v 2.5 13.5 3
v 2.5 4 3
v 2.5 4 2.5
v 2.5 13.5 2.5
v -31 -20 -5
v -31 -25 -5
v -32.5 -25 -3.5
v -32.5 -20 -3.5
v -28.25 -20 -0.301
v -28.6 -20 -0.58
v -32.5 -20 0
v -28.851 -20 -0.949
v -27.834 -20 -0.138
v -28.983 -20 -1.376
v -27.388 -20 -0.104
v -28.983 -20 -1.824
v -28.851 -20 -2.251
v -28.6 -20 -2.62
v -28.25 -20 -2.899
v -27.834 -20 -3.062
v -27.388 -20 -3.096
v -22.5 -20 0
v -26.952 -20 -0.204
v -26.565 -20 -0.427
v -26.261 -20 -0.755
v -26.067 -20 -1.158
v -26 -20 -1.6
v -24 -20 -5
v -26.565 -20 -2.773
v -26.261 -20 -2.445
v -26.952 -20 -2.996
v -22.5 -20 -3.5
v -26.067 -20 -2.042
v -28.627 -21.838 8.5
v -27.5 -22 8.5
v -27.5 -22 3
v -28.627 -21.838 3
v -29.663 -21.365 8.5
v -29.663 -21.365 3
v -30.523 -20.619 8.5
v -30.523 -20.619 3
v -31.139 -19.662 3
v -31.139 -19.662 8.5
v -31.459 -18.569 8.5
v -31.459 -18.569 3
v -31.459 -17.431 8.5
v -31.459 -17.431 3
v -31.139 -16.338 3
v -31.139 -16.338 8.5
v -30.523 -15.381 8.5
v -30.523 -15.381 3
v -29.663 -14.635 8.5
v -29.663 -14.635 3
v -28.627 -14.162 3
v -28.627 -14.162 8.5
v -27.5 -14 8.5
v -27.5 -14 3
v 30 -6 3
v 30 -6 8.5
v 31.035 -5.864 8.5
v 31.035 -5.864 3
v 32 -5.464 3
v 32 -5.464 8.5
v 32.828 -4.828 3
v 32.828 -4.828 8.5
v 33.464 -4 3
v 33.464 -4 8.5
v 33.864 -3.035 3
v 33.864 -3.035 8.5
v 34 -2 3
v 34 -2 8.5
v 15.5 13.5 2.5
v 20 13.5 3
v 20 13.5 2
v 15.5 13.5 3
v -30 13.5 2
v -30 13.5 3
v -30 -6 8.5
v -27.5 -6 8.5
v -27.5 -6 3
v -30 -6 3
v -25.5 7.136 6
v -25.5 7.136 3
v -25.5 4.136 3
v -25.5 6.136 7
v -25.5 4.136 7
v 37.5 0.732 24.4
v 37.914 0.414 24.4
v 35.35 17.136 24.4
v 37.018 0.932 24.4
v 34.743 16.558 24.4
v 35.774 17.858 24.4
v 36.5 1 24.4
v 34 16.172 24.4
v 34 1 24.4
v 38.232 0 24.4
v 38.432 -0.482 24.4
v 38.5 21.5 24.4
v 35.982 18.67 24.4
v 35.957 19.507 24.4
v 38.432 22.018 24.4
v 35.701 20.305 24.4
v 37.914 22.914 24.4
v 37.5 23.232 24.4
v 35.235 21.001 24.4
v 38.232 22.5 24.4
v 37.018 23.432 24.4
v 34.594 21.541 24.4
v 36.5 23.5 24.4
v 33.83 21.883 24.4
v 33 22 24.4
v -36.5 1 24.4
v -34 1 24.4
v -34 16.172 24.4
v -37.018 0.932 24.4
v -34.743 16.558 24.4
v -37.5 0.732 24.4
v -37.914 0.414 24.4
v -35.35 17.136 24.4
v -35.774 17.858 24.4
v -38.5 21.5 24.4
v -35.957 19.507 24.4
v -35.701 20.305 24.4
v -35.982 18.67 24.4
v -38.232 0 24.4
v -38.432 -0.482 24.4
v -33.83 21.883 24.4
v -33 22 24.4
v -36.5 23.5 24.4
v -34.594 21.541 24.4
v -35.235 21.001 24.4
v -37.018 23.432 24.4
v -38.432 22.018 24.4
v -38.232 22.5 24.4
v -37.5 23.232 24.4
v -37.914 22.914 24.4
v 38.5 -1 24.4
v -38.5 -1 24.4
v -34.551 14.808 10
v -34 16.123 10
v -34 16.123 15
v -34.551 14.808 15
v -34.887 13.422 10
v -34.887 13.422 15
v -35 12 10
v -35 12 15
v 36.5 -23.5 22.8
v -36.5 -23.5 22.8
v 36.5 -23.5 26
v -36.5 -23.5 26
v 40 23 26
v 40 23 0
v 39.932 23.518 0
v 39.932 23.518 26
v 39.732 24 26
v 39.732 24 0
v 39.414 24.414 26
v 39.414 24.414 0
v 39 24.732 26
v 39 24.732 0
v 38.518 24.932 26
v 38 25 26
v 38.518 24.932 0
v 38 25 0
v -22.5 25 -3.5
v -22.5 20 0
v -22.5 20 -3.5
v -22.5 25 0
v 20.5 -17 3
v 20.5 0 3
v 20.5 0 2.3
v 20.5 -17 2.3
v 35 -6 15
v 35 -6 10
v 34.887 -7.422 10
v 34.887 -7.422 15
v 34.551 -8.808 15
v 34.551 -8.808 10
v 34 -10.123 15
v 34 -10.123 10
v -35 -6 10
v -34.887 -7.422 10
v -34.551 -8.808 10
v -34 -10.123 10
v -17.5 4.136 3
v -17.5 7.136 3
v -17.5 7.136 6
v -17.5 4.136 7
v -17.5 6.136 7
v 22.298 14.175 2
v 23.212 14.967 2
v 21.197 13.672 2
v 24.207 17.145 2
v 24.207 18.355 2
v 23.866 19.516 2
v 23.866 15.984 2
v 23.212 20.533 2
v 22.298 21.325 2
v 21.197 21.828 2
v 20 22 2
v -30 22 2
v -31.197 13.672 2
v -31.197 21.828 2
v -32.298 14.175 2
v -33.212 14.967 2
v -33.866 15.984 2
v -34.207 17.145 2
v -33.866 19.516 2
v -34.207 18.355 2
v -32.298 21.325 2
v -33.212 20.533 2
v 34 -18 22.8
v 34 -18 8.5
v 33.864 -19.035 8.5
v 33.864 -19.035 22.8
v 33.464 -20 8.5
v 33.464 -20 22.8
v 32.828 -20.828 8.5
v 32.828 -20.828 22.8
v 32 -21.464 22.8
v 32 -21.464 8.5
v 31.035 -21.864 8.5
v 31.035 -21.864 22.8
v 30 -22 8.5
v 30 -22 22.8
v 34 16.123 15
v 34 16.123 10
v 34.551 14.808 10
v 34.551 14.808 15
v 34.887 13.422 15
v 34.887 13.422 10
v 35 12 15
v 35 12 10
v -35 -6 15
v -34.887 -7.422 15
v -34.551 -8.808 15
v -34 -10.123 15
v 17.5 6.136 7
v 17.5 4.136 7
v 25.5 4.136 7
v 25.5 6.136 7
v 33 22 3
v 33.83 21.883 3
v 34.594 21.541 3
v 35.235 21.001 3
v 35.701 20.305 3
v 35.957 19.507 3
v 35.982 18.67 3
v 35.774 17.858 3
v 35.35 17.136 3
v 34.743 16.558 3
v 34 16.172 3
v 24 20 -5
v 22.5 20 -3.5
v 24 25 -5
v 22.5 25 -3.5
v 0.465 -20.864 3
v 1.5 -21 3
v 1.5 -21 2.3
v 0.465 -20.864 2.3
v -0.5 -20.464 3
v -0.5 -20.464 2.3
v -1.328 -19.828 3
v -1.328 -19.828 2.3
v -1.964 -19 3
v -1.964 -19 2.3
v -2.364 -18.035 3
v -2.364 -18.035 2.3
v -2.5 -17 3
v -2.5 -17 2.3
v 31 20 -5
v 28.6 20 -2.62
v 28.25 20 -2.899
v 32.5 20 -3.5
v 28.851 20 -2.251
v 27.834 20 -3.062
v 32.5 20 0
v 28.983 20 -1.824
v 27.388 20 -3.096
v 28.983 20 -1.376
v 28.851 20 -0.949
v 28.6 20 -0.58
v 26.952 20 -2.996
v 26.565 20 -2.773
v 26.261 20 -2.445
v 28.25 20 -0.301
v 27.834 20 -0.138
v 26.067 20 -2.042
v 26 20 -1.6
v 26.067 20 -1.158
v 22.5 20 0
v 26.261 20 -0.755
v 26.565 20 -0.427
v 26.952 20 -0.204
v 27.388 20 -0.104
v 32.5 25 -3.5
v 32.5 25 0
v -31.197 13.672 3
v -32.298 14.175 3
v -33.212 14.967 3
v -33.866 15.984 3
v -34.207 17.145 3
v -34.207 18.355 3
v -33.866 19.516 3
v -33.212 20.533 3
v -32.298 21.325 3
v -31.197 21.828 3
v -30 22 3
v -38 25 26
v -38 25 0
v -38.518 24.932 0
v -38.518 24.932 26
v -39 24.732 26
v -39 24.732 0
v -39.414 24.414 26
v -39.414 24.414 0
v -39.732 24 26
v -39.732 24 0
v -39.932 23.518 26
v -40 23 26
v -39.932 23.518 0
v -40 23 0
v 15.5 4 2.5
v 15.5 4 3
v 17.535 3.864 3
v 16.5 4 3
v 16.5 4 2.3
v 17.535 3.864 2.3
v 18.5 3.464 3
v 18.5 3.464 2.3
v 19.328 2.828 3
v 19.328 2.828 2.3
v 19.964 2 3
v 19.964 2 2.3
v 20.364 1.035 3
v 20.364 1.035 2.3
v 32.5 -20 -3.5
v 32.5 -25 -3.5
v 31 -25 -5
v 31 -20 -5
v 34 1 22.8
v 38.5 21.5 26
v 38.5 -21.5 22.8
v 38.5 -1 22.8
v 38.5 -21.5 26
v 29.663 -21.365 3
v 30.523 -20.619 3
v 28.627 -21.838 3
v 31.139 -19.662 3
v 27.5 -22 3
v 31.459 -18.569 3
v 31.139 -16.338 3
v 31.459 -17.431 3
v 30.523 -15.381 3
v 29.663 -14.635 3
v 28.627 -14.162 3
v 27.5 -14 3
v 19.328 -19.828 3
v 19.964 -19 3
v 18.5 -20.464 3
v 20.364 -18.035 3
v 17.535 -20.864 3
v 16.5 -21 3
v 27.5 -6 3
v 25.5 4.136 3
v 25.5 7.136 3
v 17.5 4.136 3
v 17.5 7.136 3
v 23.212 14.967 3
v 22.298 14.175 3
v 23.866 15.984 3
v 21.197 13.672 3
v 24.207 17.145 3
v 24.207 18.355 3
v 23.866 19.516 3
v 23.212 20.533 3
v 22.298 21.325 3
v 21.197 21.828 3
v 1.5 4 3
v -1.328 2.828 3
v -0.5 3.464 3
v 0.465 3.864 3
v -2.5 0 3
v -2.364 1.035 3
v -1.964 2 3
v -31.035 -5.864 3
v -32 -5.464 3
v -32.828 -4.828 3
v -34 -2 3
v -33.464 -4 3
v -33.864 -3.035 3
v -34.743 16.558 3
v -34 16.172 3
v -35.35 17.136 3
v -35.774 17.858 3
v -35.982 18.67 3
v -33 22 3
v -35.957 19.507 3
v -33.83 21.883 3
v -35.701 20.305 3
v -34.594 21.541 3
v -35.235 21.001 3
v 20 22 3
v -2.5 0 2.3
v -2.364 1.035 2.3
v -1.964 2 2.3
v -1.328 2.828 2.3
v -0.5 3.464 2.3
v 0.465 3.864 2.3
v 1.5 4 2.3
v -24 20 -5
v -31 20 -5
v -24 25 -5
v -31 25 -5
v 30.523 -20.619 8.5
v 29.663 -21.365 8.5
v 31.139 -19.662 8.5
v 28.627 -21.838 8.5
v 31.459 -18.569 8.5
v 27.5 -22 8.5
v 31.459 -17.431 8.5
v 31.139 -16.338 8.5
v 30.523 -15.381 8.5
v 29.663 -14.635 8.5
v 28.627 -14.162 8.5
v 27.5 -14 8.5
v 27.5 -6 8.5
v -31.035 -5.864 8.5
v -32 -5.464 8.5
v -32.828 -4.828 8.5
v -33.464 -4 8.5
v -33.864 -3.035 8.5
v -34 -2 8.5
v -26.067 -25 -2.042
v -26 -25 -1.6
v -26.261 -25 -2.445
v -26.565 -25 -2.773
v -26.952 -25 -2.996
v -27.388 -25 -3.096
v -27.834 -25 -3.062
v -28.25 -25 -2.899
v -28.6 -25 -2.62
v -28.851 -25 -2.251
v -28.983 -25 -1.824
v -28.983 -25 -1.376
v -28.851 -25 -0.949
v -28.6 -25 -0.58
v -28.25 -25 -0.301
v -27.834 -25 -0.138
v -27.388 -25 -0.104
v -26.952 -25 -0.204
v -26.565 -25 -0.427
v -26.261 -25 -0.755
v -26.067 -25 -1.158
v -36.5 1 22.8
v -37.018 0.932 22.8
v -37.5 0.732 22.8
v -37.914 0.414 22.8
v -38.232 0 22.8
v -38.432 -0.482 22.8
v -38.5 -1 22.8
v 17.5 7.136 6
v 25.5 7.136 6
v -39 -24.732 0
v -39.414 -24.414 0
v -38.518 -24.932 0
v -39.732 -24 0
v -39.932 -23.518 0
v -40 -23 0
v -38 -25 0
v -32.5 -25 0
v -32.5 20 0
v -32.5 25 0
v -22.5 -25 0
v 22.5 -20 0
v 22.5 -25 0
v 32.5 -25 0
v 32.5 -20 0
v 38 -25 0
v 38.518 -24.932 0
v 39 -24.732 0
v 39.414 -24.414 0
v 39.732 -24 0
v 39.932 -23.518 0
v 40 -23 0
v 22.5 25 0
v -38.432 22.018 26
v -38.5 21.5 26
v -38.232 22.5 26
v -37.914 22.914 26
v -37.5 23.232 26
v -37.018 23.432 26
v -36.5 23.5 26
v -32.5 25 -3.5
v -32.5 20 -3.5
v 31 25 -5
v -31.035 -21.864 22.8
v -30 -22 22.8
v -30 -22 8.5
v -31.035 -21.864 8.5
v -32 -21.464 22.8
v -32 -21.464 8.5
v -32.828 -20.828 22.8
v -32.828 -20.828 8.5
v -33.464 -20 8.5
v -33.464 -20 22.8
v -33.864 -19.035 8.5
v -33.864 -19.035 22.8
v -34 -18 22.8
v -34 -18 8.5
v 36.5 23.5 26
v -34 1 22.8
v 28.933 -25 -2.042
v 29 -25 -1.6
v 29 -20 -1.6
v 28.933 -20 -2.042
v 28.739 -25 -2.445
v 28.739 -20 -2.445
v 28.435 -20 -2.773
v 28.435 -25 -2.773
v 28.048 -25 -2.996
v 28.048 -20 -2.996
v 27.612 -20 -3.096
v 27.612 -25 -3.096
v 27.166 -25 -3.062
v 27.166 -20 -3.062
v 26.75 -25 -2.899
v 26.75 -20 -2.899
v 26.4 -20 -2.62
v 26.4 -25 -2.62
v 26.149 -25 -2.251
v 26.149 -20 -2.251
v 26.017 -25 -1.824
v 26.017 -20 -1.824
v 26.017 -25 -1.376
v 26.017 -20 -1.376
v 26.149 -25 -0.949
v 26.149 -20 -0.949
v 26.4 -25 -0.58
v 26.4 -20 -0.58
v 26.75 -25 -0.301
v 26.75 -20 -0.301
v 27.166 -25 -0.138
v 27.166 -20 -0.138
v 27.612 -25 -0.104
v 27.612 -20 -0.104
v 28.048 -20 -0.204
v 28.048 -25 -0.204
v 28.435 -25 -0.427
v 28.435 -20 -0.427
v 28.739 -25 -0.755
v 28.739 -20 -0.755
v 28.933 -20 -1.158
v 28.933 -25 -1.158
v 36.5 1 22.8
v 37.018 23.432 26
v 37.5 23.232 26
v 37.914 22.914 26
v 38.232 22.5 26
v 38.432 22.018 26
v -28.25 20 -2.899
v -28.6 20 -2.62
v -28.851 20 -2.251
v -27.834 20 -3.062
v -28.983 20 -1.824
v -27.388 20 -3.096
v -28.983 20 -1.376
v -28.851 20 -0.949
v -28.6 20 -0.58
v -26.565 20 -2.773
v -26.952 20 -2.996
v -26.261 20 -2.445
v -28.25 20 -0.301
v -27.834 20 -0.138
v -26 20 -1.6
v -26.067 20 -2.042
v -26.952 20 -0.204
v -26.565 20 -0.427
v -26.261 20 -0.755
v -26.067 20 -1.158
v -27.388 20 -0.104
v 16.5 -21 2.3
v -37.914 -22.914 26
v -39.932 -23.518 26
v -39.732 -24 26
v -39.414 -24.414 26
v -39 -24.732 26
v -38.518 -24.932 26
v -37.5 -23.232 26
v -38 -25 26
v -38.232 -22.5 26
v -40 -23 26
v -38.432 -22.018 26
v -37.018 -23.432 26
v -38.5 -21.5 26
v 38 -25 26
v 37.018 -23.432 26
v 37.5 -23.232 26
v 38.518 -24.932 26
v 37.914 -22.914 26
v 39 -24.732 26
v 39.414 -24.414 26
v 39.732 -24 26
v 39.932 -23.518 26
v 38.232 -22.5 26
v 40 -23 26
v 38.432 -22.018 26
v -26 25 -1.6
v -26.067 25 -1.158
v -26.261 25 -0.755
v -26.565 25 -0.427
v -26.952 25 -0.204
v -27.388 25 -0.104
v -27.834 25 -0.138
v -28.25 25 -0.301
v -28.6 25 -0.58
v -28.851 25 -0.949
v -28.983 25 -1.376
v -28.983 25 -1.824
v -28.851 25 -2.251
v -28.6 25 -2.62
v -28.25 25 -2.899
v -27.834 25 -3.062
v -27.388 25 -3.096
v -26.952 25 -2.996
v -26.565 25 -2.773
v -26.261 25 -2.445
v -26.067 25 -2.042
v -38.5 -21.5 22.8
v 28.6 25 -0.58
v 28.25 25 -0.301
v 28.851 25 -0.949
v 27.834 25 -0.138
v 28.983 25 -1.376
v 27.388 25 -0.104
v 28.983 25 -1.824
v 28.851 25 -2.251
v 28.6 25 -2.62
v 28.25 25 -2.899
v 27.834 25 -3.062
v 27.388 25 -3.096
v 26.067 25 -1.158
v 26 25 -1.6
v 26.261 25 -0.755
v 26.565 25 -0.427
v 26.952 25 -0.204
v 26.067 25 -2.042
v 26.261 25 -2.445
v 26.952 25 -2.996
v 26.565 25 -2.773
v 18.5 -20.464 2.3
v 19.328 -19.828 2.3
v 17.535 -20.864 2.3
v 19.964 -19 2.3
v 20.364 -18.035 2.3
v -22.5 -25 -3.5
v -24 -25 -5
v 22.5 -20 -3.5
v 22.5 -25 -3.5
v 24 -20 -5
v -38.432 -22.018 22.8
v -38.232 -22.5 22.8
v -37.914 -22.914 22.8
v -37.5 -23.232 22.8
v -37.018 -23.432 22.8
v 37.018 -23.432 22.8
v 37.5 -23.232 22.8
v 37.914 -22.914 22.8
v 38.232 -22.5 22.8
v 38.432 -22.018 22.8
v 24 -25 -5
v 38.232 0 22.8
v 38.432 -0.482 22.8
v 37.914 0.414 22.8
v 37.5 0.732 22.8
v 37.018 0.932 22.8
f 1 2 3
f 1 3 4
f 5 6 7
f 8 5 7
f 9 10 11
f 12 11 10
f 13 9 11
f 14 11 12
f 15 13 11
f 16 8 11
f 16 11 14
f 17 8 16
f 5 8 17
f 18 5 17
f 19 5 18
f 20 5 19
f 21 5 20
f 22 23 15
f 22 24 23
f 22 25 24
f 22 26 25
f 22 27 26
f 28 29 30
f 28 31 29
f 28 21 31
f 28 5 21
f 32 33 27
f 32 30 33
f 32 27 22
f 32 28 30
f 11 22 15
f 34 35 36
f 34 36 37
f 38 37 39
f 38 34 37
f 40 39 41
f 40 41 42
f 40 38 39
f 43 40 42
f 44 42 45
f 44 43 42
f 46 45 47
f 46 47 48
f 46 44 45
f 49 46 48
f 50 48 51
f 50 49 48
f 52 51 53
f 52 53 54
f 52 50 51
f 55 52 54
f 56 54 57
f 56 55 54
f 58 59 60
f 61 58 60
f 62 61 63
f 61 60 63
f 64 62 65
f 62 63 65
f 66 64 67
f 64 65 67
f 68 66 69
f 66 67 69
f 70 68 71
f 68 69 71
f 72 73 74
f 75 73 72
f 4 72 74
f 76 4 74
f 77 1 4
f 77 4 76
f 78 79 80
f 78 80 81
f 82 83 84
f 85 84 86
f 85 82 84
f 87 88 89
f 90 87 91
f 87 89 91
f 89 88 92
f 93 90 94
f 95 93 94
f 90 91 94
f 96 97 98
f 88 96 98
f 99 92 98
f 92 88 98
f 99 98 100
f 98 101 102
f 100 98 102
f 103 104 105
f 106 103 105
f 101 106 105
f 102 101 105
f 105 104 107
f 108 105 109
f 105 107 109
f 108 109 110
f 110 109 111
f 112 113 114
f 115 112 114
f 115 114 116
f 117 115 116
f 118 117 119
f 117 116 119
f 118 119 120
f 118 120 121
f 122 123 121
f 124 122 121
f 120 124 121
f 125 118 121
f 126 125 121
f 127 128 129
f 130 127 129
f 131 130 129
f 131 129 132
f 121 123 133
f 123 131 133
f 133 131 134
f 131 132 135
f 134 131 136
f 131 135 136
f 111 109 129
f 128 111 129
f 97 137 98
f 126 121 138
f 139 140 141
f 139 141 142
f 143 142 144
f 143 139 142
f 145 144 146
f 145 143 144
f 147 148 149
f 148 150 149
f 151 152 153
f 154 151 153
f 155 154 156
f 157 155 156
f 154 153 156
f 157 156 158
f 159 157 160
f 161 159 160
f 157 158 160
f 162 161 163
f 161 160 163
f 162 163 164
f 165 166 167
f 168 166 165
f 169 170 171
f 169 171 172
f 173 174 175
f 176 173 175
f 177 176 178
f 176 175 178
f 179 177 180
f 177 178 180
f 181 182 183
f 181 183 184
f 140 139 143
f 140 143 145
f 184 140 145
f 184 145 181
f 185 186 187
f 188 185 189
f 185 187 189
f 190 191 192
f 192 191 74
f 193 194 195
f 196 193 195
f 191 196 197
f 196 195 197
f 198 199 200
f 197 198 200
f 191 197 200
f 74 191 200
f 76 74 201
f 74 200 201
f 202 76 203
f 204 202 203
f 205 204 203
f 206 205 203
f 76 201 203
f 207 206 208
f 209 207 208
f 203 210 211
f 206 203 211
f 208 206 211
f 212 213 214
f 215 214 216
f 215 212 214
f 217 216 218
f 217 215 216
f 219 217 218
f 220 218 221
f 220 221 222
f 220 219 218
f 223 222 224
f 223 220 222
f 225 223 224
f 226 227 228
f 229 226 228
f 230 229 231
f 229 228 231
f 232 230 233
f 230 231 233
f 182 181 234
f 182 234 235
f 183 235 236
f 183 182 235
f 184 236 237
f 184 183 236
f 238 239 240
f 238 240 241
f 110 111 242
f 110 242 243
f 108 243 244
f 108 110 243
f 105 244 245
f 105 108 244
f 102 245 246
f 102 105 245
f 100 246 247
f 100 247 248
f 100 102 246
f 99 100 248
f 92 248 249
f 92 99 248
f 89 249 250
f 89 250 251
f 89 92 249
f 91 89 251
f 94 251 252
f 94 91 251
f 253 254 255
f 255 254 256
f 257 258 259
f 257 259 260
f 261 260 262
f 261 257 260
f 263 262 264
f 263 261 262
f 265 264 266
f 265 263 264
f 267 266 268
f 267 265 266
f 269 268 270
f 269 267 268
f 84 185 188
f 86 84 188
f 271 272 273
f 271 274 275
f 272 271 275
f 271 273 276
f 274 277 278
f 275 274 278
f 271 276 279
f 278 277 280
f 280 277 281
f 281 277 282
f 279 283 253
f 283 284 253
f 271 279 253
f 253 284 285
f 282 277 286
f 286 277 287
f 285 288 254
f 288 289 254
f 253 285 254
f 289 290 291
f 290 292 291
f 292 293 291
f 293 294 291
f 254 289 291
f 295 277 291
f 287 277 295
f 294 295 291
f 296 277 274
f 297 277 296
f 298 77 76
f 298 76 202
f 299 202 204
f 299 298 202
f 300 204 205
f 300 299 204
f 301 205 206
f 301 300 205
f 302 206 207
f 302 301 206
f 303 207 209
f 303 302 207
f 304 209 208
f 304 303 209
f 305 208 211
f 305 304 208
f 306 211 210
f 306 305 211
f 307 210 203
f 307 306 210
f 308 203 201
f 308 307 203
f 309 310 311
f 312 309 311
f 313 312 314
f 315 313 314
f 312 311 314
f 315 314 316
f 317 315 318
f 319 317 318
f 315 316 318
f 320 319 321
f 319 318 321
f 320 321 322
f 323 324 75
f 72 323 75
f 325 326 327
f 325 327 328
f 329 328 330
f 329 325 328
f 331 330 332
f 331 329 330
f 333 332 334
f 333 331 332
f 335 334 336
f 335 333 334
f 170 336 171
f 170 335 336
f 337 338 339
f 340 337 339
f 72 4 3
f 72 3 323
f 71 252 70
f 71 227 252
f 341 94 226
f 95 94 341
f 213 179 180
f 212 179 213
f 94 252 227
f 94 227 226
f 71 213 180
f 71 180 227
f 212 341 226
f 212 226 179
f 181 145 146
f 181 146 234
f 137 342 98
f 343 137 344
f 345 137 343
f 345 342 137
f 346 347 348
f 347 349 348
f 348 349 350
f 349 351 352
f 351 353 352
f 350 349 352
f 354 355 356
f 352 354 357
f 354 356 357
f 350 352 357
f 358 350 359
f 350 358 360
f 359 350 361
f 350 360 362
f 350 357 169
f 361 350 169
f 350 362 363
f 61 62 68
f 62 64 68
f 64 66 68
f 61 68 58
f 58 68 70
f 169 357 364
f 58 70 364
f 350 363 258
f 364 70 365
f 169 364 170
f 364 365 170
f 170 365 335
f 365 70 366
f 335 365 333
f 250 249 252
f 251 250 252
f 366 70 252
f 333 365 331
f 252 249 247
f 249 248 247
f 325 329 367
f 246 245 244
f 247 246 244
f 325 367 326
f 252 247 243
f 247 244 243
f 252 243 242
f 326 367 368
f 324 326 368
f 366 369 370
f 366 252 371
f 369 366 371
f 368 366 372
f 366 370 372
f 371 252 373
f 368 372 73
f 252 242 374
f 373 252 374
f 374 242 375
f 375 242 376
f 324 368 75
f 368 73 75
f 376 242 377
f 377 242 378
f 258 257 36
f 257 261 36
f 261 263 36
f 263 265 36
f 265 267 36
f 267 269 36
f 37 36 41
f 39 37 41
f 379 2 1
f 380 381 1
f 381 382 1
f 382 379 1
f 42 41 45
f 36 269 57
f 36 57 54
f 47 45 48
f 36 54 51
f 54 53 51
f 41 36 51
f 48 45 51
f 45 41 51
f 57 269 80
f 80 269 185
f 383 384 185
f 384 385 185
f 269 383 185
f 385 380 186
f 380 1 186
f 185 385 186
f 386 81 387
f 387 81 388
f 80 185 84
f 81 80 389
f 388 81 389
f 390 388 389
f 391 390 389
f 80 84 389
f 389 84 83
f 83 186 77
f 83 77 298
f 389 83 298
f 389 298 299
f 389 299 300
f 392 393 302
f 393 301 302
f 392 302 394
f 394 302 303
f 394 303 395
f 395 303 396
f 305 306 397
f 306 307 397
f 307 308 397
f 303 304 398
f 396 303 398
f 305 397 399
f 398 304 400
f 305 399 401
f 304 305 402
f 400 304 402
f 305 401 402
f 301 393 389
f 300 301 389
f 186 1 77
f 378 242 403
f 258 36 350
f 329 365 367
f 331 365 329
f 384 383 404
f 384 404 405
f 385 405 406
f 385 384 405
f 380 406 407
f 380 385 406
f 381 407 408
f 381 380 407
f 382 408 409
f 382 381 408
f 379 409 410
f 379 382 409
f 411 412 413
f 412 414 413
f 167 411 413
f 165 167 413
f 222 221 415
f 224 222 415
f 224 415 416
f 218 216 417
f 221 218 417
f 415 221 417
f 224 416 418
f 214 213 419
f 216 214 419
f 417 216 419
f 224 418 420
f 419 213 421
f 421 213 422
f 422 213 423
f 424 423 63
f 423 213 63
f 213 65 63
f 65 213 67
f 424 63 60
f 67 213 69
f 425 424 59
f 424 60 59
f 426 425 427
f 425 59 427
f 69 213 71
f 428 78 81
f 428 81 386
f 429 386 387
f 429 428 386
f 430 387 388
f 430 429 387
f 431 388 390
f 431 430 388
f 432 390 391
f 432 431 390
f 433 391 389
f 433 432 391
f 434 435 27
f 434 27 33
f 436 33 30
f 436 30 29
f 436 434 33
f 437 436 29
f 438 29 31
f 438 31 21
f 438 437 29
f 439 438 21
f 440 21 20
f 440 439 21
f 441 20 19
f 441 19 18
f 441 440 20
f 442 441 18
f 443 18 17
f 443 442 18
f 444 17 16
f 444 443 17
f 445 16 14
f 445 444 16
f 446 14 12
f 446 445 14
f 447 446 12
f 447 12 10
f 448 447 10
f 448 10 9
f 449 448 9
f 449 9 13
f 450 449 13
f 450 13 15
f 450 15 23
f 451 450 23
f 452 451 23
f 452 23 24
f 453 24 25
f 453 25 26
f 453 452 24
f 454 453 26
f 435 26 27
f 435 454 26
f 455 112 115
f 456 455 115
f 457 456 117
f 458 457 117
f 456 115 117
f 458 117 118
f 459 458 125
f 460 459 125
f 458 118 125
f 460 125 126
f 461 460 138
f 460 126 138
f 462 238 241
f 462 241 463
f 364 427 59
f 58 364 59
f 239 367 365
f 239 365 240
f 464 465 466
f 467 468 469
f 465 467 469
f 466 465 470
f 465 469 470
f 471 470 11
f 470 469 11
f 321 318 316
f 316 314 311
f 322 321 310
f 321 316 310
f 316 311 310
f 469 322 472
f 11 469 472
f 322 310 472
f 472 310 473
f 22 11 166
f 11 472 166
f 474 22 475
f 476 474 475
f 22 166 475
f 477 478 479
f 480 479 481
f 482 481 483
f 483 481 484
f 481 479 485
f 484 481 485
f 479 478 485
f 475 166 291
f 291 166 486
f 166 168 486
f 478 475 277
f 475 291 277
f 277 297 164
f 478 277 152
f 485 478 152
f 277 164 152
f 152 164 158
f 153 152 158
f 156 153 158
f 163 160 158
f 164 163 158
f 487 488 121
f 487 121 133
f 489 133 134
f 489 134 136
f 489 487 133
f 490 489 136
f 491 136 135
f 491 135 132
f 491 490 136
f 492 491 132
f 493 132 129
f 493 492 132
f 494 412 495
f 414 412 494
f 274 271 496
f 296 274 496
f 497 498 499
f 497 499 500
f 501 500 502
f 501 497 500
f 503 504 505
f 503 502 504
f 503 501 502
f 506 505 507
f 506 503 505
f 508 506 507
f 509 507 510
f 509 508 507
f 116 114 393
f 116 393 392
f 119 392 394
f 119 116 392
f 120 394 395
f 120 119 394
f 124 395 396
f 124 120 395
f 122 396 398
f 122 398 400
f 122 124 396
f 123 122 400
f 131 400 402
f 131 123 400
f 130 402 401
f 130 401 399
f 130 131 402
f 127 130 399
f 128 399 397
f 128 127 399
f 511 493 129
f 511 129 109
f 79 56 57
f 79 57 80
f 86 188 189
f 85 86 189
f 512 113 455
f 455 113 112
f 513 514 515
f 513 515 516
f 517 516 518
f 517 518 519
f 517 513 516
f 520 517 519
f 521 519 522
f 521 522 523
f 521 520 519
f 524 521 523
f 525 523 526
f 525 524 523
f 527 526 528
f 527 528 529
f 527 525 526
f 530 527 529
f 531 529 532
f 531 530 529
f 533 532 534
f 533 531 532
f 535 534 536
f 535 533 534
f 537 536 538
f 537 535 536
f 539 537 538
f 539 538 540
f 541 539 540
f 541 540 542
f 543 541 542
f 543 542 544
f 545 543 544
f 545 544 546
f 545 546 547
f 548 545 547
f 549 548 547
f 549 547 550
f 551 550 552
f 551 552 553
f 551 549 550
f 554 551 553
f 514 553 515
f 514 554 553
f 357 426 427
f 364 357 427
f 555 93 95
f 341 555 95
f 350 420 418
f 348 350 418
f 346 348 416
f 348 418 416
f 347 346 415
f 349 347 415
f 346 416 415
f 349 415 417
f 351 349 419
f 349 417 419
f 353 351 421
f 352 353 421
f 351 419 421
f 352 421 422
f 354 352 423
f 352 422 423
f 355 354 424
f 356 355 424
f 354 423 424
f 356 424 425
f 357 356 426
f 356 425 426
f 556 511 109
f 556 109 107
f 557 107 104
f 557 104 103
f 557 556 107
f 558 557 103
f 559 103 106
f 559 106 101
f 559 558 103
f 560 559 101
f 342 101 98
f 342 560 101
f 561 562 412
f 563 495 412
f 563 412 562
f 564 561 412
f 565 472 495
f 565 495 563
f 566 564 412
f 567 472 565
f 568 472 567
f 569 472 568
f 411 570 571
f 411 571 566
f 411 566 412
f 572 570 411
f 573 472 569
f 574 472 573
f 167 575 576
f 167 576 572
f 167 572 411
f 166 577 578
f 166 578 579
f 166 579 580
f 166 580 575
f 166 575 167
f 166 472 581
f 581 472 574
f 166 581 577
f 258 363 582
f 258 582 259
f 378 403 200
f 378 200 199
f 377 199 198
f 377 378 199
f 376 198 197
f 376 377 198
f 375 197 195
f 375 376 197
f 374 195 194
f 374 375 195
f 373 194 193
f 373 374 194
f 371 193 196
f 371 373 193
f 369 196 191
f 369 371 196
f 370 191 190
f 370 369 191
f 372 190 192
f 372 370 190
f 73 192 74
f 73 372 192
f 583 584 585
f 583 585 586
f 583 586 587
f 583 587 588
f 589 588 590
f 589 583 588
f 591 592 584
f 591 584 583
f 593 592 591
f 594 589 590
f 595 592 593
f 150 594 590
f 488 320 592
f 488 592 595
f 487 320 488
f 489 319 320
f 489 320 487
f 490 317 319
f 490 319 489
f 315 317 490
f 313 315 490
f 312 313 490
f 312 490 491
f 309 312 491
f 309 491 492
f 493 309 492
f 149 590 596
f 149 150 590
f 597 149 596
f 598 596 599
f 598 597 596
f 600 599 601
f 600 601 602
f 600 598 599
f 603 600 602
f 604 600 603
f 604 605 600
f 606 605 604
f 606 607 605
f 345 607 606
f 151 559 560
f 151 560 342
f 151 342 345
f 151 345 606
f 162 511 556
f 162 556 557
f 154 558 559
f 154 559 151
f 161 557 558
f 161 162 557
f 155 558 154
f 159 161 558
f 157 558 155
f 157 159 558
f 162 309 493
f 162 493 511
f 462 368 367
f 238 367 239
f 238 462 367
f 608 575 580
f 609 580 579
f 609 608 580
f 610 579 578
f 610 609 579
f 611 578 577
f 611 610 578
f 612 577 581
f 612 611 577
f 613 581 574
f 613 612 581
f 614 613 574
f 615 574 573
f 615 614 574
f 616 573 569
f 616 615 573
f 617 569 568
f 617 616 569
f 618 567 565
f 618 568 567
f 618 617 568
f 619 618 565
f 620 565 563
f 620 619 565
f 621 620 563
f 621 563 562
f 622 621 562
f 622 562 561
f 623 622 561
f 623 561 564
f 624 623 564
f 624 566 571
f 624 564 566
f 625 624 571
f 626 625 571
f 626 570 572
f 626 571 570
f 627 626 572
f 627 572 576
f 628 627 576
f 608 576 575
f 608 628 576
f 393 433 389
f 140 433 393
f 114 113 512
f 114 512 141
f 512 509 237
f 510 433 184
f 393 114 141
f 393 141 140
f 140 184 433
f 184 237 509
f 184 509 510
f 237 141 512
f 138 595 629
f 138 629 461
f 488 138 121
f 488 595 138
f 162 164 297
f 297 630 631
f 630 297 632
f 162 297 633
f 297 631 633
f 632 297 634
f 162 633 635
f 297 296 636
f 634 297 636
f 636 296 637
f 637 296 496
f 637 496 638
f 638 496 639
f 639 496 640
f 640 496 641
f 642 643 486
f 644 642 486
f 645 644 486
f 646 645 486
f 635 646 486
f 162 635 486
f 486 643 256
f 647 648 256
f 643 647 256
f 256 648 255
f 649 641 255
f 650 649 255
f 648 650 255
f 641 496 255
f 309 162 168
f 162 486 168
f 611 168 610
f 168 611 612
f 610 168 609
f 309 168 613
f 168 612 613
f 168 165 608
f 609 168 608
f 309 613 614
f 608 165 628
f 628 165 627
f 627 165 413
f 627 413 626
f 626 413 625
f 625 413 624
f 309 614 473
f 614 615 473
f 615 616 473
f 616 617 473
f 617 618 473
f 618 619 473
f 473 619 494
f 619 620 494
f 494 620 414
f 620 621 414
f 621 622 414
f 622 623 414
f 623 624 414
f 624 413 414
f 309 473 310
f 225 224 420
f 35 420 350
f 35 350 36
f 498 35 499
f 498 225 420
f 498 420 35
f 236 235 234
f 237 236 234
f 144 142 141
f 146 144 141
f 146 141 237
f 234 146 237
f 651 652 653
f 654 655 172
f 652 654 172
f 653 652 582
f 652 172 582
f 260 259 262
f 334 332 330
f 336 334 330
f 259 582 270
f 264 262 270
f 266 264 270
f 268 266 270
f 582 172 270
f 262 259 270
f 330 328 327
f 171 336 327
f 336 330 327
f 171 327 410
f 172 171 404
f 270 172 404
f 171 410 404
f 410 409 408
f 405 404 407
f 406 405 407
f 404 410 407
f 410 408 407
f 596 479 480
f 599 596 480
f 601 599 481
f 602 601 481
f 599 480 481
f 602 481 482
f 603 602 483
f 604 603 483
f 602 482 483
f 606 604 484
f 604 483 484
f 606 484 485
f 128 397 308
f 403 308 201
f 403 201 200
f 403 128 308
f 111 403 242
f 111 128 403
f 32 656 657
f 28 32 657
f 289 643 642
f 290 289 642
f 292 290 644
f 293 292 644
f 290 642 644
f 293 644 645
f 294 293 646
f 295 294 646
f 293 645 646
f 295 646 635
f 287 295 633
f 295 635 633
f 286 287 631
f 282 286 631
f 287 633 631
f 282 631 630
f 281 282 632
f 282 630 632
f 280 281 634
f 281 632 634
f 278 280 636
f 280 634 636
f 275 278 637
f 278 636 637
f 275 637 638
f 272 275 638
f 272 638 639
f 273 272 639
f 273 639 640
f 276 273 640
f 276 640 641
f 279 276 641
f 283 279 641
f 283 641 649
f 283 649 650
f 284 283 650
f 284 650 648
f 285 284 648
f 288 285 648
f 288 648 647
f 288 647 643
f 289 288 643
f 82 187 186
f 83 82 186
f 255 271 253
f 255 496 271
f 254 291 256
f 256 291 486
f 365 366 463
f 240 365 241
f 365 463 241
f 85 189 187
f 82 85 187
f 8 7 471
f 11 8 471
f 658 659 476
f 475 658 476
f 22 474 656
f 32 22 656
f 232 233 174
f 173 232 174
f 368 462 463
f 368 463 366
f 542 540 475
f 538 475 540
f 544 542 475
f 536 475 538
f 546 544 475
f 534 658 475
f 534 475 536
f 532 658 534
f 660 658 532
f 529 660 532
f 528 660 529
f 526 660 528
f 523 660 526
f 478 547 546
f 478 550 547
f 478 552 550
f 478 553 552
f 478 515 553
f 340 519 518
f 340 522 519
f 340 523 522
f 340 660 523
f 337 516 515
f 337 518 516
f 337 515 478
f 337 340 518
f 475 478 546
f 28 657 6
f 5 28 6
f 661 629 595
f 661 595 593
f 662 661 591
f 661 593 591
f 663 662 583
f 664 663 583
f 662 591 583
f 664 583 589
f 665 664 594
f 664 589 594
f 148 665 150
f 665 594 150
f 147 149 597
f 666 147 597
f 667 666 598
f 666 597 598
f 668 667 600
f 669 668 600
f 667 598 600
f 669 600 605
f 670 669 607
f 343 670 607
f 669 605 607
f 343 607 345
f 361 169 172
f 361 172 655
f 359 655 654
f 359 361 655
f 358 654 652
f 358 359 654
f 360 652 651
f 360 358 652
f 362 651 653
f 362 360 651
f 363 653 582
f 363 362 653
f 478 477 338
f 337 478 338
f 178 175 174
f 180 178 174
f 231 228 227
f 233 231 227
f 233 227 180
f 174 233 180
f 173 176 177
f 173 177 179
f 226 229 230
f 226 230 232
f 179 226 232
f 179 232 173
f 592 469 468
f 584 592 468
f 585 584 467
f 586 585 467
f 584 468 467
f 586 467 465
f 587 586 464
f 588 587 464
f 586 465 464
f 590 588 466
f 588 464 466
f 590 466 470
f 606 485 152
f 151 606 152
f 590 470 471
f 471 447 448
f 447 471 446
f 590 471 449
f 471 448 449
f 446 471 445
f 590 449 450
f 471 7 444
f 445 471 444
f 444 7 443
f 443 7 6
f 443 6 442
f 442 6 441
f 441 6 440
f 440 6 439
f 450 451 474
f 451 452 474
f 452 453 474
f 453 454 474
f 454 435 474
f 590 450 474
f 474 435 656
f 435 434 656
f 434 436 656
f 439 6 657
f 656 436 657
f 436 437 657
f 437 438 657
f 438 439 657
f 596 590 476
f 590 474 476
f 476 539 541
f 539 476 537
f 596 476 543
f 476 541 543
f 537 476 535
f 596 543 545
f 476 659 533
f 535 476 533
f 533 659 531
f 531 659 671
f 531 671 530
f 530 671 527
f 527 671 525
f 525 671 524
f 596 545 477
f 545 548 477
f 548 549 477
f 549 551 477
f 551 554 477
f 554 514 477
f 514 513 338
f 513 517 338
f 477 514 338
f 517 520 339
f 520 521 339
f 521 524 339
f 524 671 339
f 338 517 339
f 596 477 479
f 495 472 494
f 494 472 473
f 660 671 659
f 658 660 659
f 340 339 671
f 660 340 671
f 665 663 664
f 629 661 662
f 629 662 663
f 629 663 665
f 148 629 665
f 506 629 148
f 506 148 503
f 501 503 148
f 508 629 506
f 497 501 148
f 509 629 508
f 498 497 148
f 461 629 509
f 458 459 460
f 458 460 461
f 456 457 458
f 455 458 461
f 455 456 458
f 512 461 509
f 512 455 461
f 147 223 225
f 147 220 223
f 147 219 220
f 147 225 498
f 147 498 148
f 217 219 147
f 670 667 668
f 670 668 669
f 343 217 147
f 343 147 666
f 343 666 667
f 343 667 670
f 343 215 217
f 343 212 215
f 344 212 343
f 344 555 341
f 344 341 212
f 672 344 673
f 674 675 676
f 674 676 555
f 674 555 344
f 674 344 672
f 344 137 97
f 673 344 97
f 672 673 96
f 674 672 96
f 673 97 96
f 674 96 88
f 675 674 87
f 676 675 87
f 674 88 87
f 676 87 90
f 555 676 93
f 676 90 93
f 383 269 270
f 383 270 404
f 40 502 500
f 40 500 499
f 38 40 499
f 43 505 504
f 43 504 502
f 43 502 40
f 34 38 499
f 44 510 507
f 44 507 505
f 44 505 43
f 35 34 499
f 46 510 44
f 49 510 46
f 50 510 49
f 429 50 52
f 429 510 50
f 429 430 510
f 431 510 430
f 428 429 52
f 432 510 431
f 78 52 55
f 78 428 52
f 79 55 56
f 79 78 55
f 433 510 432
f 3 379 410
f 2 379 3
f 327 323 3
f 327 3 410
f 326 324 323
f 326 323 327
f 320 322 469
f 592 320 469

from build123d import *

# Parameters (mm, degrees)
EXTRUDE_1_DEPTH            = 26
CUT_EXTRUDE_1_DEPTH        = 23
CUT_EXTRUDE_2_DEPTH        = 1.6
EXTRUDE_START              = 5.5
EXTRUDE_2_DEPTH            = 5.5
EXTRUDE_START_2            = 17.5
EXTRUDE_3_DEPTH            = 8
CUT_EXTRUDE_3_DEPTH        = 1.6
SKETCH_10_W                = 10
SKETCH_10_H                = 5
EXTRUDE_4_DEPTH            = 5
SKETCH_11_R                = 1.5
CUT_EXTRUDE_4_DEPTH        = 70.108610173
CHAMFER_1_SIZE             = 1.5
CHAMFER_1_OF_MIRROR_2_SIZE = 1.5
MIRROR_START               = -25
MIRROR_3_OUTLINE_R         = 1.5
MIRROR_3_DEPTH             = 5
CUT_EXTRUDE1_START         = 1.5
CUT_EXTRUDE1_DEPTH         = 5
CUT_EXTRUDE_5_DEPTH        = 0.7
CUT_EXTRUDE_6_DEPTH        = 1
SKETCH_16_W                = 13
SKETCH_16_H                = 9.5
CUT_EXTRUDE_10_DEPTH       = 0.5


# Read off the part's stored shape, not the designer's step: Зеркальное отражение3
with BuildPart() as part:
    # Эскиз1 → Бобышка-Вытянуть1 (new body)
    with BuildSketch(Plane.XY):
        with BuildLine():
            Line((-38, -25), (38, -25))
            ThreePointArc((38, -25), (39.414213562, -24.414213562), (40, -23))
            Line((40, -23), (40, 23))
            ThreePointArc((40, 23), (39.414213562, 24.414213562), (38, 25))
            Line((38, 25), (-38, 25))
            ThreePointArc((-38, 25), (-39.414213562, 24.414213562), (-40, 23))
            Line((-40, 23), (-40, -23))
            ThreePointArc((-40, -23), (-39.414213562, -24.414213562), (-38, -25))
        make_face()
    extrude(amount=EXTRUDE_1_DEPTH)

    # Эскиз4 → Вырез-Вытянуть1 (cut)
    with BuildSketch(Plane.XY.offset(26)):
        with BuildLine():
            Line((-33, 22), (33, 22))
            ThreePointArc((33, 22), (35.956795679, 19.507305936), (34, 16.171572875))
            Line((34, 16.171572875), (34, 13.509108241))
            Line((34, 13.509108241), (34, -18))
            ThreePointArc((34, -18), (32.828427125, -20.828427125), (30, -22))
            Line((30, -22), (-30, -22))
            ThreePointArc((-30, -22), (-32.828427125, -20.828427125), (-34, -18))
            Line((-34, -18), (-34, 13.509108241))
            Line((-34, 13.509108241), (-34, 16.171572875))
            ThreePointArc((-34, 16.171572875), (-35.956795679, 19.507305936), (-33, 22))
        make_face()
    extrude(amount=-CUT_EXTRUDE_1_DEPTH, mode=Mode.SUBTRACT)

    # Эскиз6 → Вырез-Вытянуть2 (cut)
    with BuildSketch(Plane.XY.offset(26)):
        with BuildLine():
            Line((-36.5, 23.5), (36.5, 23.5))
            ThreePointArc((36.5, 23.5), (37.914213562, 22.914213562), (38.5, 21.5))
            Line((38.5, 21.5), (38.5, -21.5))
            ThreePointArc((38.5, -21.5), (37.914213562, -22.914213562), (36.5, -23.5))
            Line((36.5, -23.5), (-36.5, -23.5))
            ThreePointArc((-36.5, -23.5), (-37.914213562, -22.914213562), (-38.5, -21.5))
            Line((-38.5, -21.5), (-38.5, 21.5))
            ThreePointArc((-38.5, 21.5), (-37.914213562, 22.914213562), (-36.5, 23.5))
        make_face()
    extrude(amount=-CUT_EXTRUDE_2_DEPTH, mode=Mode.SUBTRACT)

    # Эскиз7 → Бобышка-Вытянуть2 (add)
    with BuildSketch(Plane.XY.offset(3).offset(EXTRUDE_START)):
        with BuildLine():
            Line((-27.5, -6), (-30, -6))
            ThreePointArc((-30, -6), (-32.828427125, -4.828427125), (-34, -2))
            Line((-34, -2), (-34, -18))
            ThreePointArc((-34, -18), (-32.828427125, -20.828427125), (-30, -22))
            Line((-30, -22), (-27.5, -22))
            ThreePointArc((-27.5, -22), (-31.5, -18), (-27.5, -14))
            Line((-27.5, -14), (-27.5, -6))
        make_face()
    extrude_2 = extrude(amount=-EXTRUDE_2_DEPTH)

    # Зеркальное отражение4: Бобышка-Вытянуть2 across plane
    add(extrude_2.mirror(Plane(origin=(0, 0, 0), x_dir=(0, 0, 1), z_dir=(1, 0, 0))))

    # Эскиз8 → Бобышка-Вытянуть3 (add)
    with BuildSketch(Plane(origin=(0, 0, 0), x_dir=(0, 0, -1), z_dir=(1, 0, 0)).offset(EXTRUDE_START_2)):
        Polygon((-6, 7.136038969), (-3, 7.136038969), (-3, 4.136038969), (-7, 4.136038969), (-7, 6.136038969), align=None)
    extrude_3 = extrude(amount=EXTRUDE_3_DEPTH)

    # Зеркальное отражение1: Бобышка-Вытянуть3 across plane
    add(extrude_3.mirror(Plane(origin=(0, 0, 0), x_dir=(0, 0, 1), z_dir=(1, 0, 0))))

    # Эскиз9 → Вырез-Вытянуть3 (cut)
    with BuildSketch(Plane.XY.offset(24.4)):
        with BuildLine():
            Line((-36.5, -23.5), (36.5, -23.5))
            ThreePointArc((36.5, -23.5), (37.914213562, -22.914213562), (38.5, -21.5))
            Line((38.5, -21.5), (38.5, -1))
            ThreePointArc((38.5, -1), (37.914213562, 0.414213562), (36.5, 1))
            Line((36.5, 1), (-36.5, 1))
            ThreePointArc((-36.5, 1), (-37.914213562, 0.414213562), (-38.5, -1))
            Line((-38.5, -1), (-38.5, -21.5))
            ThreePointArc((-38.5, -21.5), (-37.914213562, -22.914213562), (-36.5, -23.5))
        make_face()
    extrude(amount=-CUT_EXTRUDE_3_DEPTH, mode=Mode.SUBTRACT)

    # Эскиз10 → Бобышка-Вытянуть4 (add)
    with BuildSketch(Plane(origin=(0, 0, 0), x_dir=(-1, 0, 0), z_dir=(0, 0, -1))):
        with Locations((-27.5, 22.5)):
            Rectangle(SKETCH_10_W, SKETCH_10_H)
    extrude_4 = extrude(amount=EXTRUDE_4_DEPTH)

    # Эскиз11 → Вырез-Вытянуть4 (cut, through all)
    with BuildSketch(Plane(origin=(0, 25, 0), x_dir=(1, 0, 0), z_dir=(0, 1, 0))):
        with Locations(Location((27.5, 1.6, 0), (0, 0, 180))):
            Circle(SKETCH_11_R)
    cut_extrude_4 = extrude(amount=-CUT_EXTRUDE_4_DEPTH, mode=Mode.SUBTRACT)

    # Фаска1
    chamfer_1_edges = [part.edges().sort_by_distance(p)[0] for p in [
        (32.5, 22.5, -5),
        (22.5, 22.5, -5),
    ]]
    chamfer(chamfer_1_edges, length=CHAMFER_1_SIZE)

    # Зеркальное отражение2: Бобышка-Вытянуть4, Вырез-Вытянуть4 across plane
    add(extrude_4.mirror(Plane(origin=(0, 0, 0), x_dir=(0, 0, 1), z_dir=(1, 0, 0))))
    add(cut_extrude_4.mirror(Plane(origin=(0, 0, 0), x_dir=(0, 0, 1), z_dir=(1, 0, 0))), mode=Mode.SUBTRACT)

    # Фаска1 of Зеркальное отражение2
    chamfer_1_of_mirror_2_edges = [part.edges().sort_by_distance(p)[0] for p in [
        (-32.5, 22.5, -5),
        (-22.5, 22.5, -5),
    ]]
    chamfer(chamfer_1_of_mirror_2_edges, length=CHAMFER_1_OF_MIRROR_2_SIZE)

    # Зеркальное отражение3 outline → Зеркальное отражение3 (add)
    # profile 1 of 2: a face of its own
    with BuildSketch(Plane(origin=(0, 0, 0), x_dir=(1, 0, 0), z_dir=(0, 1, 0)).offset(MIRROR_START)):
        Polygon((22.5, 0), (32.5, 0), (32.5, 3.5), (31, 5), (24, 5), (22.5, 3.5), align=None)
        with Locations((27.5, 1.6)):
            Circle(MIRROR_3_OUTLINE_R, mode=Mode.SUBTRACT)
    # profile 2 of 2: a face of its own
    with BuildSketch(Plane(origin=(0, 0, 0), x_dir=(1, 0, 0), z_dir=(0, 1, 0)).offset(MIRROR_START)):
        Polygon((-32.5, 0), (-22.5, 0), (-22.5, 3.5), (-24, 5), (-31, 5), (-32.5, 3.5), align=None)
        with Locations((-27.5, 1.6)):
            Circle(MIRROR_3_OUTLINE_R, mode=Mode.SUBTRACT)
    extrude(amount=MIRROR_3_DEPTH)

    # Sketch1 → Cut-Extrude1 (cut)
    with BuildSketch(Plane.XY.offset(8.5).offset(CUT_EXTRUDE1_START)):
        with BuildLine():
            Line((35, 12), (35, -6))
            ThreePointArc((35, -6), (34.746427842, -8.121320344), (34, -10.123105626))
            Line((34, -10.123105626), (34, 16.123105626))
            ThreePointArc((34, 16.123105626), (34.746427842, 14.121320344), (35, 12))
        make_face()
    cut_extrude1 = extrude(amount=CUT_EXTRUDE1_DEPTH, mode=Mode.SUBTRACT)

    # Mirror1: Cut-Extrude1 across plane
    add(cut_extrude1.mirror(Plane(origin=(0, 0, 0), x_dir=(0, 0, 1), z_dir=(1, 0, 0))), mode=Mode.SUBTRACT)

    # Эскиз13 → Вырез-Вытянуть5 (cut)
    with BuildSketch(Plane.XY.offset(3)):
        with BuildLine():
            Line((15.5, 4), (16.5, 4))
            ThreePointArc((16.5, 4), (19.328427125, 2.828427125), (20.5, 0))
            Line((20.5, 0), (20.5, -17))
            ThreePointArc((20.5, -17), (19.328427125, -19.828427125), (16.5, -21))
            Line((16.5, -21), (1.5, -21))
            ThreePointArc((1.5, -21), (-1.328427125, -19.828427125), (-2.5, -17))
            Line((-2.5, -17), (-2.5, 0))
            ThreePointArc((-2.5, 0), (-1.328427125, 2.828427125), (1.5, 4))
            Line((1.5, 4), (2.5, 4))
            Line((2.5, 4), (15.5, 4))
        make_face()
    extrude(amount=-CUT_EXTRUDE_5_DEPTH, mode=Mode.SUBTRACT)

    # Эскиз14 → Вырез-Вытянуть6 (cut)
    with BuildSketch(Plane.XY.offset(3)):
        with BuildLine():
            Line((-30, 22), (20, 22))
            ThreePointArc((20, 22), (24.25, 17.75), (20, 13.5))
            Line((20, 13.5), (-30, 13.5))
            ThreePointArc((-30, 13.5), (-34.25, 17.75), (-30, 22))
        make_face()
    extrude(amount=-CUT_EXTRUDE_6_DEPTH, mode=Mode.SUBTRACT)

    # Эскиз16 → Вырез-Вытянуть10 (cut)
    with BuildSketch(Plane.XY.offset(3)):
        with Locations((9, 8.75)):
            Rectangle(SKETCH_16_W, SKETCH_16_H)
    extrude(amount=-CUT_EXTRUDE_10_DEPTH, mode=Mode.SUBTRACT)


solid = part.part
